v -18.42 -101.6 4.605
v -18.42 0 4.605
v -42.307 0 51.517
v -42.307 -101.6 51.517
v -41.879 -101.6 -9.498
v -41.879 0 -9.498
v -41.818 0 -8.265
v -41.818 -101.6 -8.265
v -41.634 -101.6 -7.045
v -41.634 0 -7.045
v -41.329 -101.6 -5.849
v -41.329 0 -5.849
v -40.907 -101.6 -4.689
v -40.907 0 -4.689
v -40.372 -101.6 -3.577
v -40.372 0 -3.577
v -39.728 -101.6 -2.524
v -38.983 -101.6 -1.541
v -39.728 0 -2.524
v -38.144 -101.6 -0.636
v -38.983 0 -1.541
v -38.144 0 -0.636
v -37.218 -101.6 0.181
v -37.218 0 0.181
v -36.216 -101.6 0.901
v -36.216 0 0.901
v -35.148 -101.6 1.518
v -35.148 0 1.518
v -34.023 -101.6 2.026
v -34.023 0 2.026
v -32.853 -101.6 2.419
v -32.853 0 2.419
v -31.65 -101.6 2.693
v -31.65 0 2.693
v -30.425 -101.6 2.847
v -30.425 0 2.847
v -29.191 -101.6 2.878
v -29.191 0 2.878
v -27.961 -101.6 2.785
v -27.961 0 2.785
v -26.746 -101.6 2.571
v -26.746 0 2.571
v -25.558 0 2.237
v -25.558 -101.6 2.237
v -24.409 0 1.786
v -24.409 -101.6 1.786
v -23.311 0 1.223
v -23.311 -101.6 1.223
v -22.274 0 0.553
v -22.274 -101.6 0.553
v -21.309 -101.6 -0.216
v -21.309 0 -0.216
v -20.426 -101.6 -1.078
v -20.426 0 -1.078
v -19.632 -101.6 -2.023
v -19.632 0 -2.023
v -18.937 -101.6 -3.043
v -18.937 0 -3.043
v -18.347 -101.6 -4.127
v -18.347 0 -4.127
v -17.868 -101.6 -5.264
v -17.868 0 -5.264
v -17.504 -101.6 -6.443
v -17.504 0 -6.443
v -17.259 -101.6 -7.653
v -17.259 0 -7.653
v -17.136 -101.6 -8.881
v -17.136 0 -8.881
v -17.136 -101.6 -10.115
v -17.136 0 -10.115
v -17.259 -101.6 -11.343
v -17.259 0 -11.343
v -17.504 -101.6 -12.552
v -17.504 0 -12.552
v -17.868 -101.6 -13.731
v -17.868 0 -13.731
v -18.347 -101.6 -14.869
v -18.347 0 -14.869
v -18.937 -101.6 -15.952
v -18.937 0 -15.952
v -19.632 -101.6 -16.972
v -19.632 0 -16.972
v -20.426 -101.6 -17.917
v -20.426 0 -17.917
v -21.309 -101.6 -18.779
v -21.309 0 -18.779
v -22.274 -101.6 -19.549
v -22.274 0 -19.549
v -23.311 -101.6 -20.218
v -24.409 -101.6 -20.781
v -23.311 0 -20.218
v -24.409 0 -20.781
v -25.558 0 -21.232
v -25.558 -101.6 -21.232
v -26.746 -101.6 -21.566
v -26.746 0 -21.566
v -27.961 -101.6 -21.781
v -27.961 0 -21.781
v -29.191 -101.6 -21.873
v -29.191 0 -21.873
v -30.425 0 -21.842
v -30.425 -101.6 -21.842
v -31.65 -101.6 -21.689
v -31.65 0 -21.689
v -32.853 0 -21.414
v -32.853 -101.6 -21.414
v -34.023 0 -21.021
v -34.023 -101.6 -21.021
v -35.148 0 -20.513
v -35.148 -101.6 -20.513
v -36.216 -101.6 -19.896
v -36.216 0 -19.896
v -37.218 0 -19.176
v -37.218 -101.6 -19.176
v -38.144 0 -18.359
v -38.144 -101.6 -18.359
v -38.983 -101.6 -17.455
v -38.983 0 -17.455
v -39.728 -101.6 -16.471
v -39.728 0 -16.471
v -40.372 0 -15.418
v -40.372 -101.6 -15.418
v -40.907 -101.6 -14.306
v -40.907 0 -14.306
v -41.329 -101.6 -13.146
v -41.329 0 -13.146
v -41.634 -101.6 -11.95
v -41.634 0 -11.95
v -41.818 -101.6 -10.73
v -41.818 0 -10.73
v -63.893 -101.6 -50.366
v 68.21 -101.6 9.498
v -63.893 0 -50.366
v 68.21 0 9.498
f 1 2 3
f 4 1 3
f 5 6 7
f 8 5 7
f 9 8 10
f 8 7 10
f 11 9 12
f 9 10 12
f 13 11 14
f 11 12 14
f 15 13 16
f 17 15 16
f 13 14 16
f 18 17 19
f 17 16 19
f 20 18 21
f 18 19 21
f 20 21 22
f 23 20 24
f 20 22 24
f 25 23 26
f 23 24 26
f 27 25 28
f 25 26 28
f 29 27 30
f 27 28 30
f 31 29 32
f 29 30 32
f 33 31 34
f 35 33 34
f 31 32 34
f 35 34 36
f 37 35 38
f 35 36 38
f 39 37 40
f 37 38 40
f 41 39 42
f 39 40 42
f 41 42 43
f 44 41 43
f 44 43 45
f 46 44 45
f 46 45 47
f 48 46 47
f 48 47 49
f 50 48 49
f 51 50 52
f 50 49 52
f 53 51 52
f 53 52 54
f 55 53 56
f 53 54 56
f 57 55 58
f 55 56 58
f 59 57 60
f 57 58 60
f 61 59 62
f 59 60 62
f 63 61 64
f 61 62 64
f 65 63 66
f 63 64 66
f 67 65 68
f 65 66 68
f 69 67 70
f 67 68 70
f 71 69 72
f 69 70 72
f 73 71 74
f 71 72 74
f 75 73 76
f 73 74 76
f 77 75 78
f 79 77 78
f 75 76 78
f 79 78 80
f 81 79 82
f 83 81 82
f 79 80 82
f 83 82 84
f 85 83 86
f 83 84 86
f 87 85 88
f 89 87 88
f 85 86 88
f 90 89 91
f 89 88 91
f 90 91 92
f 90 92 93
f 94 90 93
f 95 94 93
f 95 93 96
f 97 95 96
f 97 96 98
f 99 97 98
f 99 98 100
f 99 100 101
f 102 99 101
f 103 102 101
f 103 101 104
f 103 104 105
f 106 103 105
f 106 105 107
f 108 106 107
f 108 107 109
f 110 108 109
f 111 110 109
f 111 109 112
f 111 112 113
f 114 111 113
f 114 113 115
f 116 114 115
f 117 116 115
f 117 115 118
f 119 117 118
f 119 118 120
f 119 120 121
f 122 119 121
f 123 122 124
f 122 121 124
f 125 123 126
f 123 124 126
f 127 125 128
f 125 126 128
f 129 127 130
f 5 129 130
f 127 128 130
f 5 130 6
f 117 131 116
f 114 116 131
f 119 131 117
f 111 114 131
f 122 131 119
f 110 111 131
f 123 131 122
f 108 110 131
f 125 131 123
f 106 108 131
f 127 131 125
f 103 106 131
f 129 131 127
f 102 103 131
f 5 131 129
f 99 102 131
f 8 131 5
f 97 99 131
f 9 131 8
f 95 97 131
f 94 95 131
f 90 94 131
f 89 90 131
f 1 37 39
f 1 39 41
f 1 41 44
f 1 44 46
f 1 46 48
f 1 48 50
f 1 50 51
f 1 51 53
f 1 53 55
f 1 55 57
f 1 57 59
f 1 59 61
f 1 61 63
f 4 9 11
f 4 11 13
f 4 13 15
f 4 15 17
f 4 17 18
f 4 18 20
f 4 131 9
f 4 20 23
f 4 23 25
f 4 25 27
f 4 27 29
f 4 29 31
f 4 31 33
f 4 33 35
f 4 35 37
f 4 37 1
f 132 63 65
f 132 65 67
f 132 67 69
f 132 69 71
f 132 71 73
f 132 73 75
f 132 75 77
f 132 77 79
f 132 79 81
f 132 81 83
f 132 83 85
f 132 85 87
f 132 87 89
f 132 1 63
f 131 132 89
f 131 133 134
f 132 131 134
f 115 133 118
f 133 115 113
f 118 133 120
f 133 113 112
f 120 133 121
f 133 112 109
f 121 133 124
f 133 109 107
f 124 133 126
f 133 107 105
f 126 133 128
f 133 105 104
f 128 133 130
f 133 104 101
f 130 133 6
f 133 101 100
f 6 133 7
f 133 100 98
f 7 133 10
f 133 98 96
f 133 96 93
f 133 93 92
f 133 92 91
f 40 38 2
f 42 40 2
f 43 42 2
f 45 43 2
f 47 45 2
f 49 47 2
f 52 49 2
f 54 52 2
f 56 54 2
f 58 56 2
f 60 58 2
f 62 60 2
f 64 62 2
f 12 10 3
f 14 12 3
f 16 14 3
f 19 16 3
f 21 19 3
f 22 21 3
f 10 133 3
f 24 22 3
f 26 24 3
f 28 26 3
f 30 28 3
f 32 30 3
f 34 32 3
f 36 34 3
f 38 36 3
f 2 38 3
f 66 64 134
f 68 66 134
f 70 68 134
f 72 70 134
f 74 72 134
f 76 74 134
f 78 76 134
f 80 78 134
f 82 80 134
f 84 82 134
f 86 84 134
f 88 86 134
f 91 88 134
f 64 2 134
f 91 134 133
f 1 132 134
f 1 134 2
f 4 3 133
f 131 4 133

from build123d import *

# Parameters (mm, degrees)
F1_DEPTH = 101.6
F2_R     = 11.747271
F3_DEPTH = 101.6
F4_R     = 12.378993
F5_DEPTH = 101.6


with BuildPart() as f1:
    # F0 (on Front) → F1 (new body)
    with BuildSketch(Plane.XZ):
        Polygon((-18.419569, 4.604892), (-42.307448, 51.51723), (-63.892879, -50.366007), (68.209969, 9.49759), align=None)
    extrude(amount=F1_DEPTH)

    # F2 (on face) → F3 (join)
    with BuildSketch(Plane(origin=(0, 0, 0), x_dir=(-1, 0, 0), z_dir=(0, 1, 0))):
        with Locations((29.212283, -10.073202)):
            Circle(F2_R)
    extrude(amount=-F3_DEPTH)

    # F4 (on face) → F5 (cut)
    with BuildSketch(Plane(origin=(0, 0, 0), x_dir=(-1, 0, 0), z_dir=(0, 1, 0))):
        with Locations((29.500088, -9.49759)):
            Circle(F4_R)
    extrude(amount=-F5_DEPTH, mode=Mode.SUBTRACT)


solid = f1.part
